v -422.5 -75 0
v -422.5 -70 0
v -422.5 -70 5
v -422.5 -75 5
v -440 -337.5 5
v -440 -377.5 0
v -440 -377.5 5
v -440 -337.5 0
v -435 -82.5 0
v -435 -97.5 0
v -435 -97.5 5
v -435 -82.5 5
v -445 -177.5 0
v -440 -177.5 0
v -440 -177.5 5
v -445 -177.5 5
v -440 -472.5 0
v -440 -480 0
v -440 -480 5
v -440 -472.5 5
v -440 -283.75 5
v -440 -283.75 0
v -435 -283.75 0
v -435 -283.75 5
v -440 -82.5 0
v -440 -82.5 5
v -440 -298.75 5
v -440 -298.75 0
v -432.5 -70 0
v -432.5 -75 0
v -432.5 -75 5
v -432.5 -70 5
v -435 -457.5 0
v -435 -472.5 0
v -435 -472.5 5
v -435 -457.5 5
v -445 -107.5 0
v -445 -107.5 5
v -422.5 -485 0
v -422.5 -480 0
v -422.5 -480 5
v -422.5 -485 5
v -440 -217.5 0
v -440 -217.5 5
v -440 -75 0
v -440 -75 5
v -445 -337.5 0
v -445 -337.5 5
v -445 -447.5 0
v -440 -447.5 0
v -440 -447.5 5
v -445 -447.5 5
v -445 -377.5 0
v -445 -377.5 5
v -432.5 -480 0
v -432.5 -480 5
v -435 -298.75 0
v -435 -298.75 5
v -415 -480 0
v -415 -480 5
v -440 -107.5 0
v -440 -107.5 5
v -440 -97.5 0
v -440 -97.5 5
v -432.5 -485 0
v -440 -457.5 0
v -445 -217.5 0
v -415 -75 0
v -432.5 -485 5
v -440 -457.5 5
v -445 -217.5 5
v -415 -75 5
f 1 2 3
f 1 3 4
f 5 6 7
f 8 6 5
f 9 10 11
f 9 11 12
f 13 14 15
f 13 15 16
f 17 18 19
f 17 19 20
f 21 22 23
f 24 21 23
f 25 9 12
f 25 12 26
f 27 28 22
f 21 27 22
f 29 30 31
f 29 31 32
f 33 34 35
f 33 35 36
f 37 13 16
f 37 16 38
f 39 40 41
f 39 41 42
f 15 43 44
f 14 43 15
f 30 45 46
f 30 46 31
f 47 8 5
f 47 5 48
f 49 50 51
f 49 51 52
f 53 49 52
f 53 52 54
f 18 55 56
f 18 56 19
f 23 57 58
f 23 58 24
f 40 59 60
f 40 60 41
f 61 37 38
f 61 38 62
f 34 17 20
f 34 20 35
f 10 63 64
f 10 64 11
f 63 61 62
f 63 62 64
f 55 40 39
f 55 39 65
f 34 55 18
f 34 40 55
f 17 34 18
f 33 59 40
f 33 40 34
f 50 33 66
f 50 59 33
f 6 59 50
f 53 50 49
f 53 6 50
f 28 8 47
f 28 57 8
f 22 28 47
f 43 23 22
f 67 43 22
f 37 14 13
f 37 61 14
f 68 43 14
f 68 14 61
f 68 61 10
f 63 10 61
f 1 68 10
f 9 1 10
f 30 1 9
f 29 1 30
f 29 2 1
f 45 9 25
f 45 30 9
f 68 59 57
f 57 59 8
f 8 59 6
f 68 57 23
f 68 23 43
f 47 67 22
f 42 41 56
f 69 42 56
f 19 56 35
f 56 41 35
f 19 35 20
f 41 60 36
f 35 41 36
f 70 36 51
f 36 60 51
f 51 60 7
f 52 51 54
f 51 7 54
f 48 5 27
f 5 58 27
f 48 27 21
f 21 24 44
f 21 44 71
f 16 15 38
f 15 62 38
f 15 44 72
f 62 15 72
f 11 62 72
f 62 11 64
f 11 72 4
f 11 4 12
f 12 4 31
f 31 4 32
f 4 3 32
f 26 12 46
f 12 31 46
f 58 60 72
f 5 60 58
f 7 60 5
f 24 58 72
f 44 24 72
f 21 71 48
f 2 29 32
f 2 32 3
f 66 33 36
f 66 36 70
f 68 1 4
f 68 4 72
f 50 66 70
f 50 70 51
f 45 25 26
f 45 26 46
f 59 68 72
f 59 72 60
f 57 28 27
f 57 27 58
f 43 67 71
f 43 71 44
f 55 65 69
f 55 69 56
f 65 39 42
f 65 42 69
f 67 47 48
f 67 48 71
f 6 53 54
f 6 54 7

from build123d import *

# Parameters (mm, degrees)
SKETCH1_W           = 5
SKETCH1_H           = 15
BOSS_EXTRUDE1_DEPTH = 5


with BuildPart() as part:
    # Sketch1 → Boss-Extrude1 (new body)
    with BuildSketch(Plane.XY):
        Polygon((-440, -217.5), (-440, -177.5), (-445, -177.5), (-445, -107.5), (-440, -107.5), (-440, -97.5), (-435, -97.5), (-435, -82.5), (-440, -82.5), (-440, -75), (-432.5, -75), (-432.5, -70), (-422.5, -70), (-422.5, -75), (-415, -75), (-415, -480), (-422.5, -480), (-422.5, -485), (-432.5, -485), (-432.5, -480), (-440, -480), (-440, -472.5), (-435, -472.5), (-435, -457.5), (-440, -457.5), (-440, -447.5), (-445, -447.5), (-445, -377.5), (-440, -377.5), (-440, -337.5), (-445, -337.5), (-445, -217.5), align=None)
        with Locations((-437.5, -291.25)):
            Rectangle(SKETCH1_W, SKETCH1_H, mode=Mode.SUBTRACT)
    extrude(amount=BOSS_EXTRUDE1_DEPTH)


solid = part.part
